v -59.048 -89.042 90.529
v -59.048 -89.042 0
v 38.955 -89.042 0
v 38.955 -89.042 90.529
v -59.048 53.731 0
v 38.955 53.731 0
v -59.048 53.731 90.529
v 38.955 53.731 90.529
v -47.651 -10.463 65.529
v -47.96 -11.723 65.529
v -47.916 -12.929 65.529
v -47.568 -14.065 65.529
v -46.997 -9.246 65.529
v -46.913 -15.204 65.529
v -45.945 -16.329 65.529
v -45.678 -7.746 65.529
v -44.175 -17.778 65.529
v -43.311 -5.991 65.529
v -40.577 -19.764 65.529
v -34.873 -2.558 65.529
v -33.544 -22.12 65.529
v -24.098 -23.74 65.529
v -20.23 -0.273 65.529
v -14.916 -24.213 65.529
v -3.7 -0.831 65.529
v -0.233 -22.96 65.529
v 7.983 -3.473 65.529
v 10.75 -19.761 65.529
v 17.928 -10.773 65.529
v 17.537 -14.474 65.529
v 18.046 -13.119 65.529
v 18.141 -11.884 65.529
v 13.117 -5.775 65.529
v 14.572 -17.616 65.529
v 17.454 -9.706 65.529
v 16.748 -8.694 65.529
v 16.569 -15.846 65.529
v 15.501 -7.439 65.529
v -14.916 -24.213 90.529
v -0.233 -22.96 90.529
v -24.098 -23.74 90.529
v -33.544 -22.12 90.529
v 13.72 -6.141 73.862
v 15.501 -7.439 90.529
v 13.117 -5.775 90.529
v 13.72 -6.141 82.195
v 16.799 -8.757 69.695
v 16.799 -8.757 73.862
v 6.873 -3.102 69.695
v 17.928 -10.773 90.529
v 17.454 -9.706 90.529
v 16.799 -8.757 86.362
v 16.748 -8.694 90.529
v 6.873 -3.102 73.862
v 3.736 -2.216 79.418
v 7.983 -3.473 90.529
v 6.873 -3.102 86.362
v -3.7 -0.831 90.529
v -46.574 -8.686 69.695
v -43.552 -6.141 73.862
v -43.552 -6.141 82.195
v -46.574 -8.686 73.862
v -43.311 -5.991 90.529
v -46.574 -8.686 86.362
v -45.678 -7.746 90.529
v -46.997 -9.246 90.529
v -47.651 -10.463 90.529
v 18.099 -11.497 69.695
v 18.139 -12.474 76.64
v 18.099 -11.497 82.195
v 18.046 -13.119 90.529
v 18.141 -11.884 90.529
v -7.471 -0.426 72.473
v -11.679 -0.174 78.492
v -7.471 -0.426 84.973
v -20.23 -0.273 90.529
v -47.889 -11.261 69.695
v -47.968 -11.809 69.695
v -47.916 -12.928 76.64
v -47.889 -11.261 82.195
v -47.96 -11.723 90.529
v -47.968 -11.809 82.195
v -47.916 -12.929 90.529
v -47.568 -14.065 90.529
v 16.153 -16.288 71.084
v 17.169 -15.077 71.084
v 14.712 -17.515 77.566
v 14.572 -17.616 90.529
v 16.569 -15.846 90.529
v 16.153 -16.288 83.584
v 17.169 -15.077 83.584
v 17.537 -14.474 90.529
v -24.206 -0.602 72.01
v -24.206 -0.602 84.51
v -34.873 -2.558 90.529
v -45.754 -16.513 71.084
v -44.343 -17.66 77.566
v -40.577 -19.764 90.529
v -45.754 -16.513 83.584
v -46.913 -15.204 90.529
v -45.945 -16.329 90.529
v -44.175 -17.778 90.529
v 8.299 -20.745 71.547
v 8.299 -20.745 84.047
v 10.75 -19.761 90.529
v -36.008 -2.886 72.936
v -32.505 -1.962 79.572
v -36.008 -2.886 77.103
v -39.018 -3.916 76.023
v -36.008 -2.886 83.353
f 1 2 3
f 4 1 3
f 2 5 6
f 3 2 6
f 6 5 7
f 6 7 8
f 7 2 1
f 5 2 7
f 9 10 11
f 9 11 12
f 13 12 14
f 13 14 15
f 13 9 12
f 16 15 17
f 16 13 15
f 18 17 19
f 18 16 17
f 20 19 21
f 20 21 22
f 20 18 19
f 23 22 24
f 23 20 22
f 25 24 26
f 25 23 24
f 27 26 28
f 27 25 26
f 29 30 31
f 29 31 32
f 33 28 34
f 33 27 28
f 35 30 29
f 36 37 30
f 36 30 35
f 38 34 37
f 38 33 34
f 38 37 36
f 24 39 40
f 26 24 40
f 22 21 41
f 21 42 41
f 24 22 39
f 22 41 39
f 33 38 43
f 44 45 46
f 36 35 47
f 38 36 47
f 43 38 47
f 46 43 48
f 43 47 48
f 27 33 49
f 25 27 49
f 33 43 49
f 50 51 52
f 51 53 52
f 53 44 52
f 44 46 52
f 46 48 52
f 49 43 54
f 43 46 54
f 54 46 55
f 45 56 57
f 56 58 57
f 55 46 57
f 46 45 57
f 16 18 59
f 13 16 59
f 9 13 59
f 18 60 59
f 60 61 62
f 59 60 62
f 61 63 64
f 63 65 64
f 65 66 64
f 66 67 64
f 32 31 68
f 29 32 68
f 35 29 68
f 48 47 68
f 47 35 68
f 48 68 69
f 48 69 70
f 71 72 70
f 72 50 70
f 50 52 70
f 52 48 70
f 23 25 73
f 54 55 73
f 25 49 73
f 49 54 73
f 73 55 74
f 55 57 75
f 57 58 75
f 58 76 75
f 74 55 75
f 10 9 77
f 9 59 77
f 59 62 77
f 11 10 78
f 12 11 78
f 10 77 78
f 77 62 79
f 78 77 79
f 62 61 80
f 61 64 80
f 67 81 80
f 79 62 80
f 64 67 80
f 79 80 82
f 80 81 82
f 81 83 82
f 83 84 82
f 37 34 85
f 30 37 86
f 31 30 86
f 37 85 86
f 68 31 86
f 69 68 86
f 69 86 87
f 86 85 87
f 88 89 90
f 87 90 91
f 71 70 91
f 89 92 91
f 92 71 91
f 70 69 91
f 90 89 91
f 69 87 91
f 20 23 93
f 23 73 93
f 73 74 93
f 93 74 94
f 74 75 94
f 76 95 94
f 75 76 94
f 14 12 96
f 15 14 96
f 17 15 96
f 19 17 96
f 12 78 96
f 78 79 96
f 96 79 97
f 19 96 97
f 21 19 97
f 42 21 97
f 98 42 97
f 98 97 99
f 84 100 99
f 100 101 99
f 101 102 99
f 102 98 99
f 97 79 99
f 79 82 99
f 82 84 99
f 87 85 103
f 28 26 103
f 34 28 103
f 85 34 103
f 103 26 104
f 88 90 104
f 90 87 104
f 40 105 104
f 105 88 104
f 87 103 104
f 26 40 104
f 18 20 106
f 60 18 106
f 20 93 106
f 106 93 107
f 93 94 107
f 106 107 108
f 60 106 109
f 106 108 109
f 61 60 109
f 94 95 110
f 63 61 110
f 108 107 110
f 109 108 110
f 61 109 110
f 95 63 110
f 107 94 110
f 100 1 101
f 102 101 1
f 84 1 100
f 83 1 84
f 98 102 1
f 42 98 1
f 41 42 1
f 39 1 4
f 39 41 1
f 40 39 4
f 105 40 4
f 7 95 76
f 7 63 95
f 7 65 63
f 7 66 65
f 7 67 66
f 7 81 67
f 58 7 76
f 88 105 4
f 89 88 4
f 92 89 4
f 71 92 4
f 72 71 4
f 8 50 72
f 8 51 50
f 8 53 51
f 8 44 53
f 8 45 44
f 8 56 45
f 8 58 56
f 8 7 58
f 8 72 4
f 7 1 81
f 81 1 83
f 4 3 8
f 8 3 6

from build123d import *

# Parameters (mm, degrees)
F0_W     = 98.003034
F0_H     = 142.7726
F1_DEPTH = 90.528794
F3_DEPTH = 25


with BuildPart() as f1:
    # F0 (on Top) → F1 (new body)
    with BuildSketch(Plane.XY):
        with Locations((-10.046577, -17.655231)):
            Rectangle(F0_W, F0_H)
    extrude(amount=F1_DEPTH)

    # F2 (on face) → F3 (cut)
    with BuildSketch(Plane.XY.offset(90.528794)):
        with BuildLine():
            add(Edge.make_bspline(
                [(-14.916189, -24.213478), (42.35569, -24.213478), (13.71975, -6.140597), (-14.916189, 11.932283), (-43.552128, -6.140597), (-72.188068, -24.213478), (-14.916189, -24.213478)],
                knots=[4.712389, 4.712389, 4.712389, 6.806784, 6.806784, 8.901179, 8.901179, 10.995574, 10.995574, 10.995574], degree=2, weights=[1, 0.5, 1, 0.5, 1, 0.5, 1]))
        make_face()
    extrude(amount=-F3_DEPTH, mode=Mode.SUBTRACT)


solid = f1.part
